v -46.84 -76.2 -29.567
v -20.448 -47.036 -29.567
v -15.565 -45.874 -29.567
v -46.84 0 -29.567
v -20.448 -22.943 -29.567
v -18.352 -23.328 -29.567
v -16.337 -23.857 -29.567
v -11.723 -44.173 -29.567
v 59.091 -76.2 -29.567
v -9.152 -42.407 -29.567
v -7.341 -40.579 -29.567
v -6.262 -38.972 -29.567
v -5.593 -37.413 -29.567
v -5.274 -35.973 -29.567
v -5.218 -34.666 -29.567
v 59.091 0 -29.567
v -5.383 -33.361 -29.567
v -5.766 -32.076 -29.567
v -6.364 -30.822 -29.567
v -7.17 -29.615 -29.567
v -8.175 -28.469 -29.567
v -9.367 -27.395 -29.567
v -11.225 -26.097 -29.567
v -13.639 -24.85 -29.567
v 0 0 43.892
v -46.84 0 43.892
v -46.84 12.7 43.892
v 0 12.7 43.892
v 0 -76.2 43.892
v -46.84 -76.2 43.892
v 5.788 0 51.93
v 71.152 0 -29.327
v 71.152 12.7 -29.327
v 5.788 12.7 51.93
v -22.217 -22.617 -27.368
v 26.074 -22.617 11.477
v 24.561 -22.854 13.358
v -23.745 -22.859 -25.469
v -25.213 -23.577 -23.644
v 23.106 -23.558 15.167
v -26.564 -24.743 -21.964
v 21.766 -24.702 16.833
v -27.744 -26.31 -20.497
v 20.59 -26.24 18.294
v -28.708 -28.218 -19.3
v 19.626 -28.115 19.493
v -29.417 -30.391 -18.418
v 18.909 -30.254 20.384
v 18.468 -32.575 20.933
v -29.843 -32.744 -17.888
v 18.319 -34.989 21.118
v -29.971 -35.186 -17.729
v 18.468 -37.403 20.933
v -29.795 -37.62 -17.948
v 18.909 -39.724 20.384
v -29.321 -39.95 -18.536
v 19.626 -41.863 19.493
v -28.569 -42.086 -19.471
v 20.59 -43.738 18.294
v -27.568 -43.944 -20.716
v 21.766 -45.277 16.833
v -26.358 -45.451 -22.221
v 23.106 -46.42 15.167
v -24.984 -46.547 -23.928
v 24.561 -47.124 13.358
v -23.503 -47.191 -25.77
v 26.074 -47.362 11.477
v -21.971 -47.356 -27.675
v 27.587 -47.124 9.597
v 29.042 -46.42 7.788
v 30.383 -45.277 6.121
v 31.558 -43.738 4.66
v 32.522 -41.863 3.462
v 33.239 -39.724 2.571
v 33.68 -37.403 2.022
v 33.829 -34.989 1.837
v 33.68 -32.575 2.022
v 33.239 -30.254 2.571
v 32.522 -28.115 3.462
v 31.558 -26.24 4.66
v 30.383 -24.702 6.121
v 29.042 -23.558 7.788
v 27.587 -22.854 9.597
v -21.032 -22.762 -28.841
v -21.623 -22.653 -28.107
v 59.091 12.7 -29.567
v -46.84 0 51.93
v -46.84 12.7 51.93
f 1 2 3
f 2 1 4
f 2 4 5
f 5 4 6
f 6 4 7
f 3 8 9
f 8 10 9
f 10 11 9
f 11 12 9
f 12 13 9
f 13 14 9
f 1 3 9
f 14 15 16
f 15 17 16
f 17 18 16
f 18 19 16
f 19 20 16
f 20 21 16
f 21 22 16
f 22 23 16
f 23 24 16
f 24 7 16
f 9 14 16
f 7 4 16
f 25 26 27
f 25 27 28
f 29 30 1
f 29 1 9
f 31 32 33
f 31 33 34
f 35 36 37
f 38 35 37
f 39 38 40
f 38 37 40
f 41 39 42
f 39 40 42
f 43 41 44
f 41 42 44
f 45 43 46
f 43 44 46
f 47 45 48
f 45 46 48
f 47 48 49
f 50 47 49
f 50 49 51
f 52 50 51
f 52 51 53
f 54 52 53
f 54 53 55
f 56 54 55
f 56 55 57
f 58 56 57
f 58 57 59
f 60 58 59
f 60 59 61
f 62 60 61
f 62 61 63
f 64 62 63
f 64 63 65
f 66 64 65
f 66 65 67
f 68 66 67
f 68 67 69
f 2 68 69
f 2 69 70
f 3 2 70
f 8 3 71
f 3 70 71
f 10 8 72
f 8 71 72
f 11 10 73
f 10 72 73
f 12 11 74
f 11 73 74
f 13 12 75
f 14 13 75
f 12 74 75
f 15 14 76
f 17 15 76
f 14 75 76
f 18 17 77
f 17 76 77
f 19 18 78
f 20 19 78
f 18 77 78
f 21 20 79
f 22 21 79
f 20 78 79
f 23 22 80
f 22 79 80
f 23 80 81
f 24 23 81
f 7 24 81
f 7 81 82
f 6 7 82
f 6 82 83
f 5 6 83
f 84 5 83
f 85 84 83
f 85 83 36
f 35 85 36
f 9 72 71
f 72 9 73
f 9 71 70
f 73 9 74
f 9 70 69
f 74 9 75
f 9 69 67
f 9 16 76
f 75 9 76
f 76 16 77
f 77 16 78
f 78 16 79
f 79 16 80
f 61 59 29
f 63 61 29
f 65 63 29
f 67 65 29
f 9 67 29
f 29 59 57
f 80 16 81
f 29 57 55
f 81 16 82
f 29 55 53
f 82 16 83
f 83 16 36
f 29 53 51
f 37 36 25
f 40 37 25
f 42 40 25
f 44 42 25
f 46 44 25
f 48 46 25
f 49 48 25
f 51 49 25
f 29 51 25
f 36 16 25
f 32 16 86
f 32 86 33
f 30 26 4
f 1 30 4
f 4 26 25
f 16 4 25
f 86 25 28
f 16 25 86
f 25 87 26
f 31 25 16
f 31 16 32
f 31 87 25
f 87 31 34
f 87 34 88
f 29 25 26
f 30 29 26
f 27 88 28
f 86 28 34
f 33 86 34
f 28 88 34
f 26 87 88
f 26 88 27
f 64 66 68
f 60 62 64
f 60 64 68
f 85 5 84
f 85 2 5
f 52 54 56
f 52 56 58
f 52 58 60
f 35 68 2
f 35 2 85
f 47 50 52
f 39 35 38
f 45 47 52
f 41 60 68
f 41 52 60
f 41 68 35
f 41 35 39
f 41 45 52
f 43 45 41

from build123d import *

# Parameters (mm, degrees)
F1_DEPTH = 76.2
F2_DEPTH = 12.7
F3_R     = 12.3726217029
F4_DEPTH = 61.976


with BuildPart() as f1:
    # F0 (on Front) → F1 (new body)
    with BuildSketch(Plane.XZ):
        Polygon((0, 43.8915863633), (-46.8400269747, 43.8915863633), (-46.8400269747, -29.5672435313), (59.0905994177, -29.5672435313), align=None)
    extrude(amount=F1_DEPTH)

    # F0 (on Front) → F2 (join)
    with BuildSketch(Plane.XZ):
        Polygon((-46.8400269747, 51.9304850427), (-46.8400269747, 43.8915863633), (0, 43.8915863633), (59.0905994177, -29.5672435313), (71.1518924552, -29.3272192482), (5.7878448555, 51.9304850427), align=None)
    extrude(amount=-F2_DEPTH)

    # F3 (on face) → F4 (cut)
    with BuildSketch(Plane(origin=(21.4360413899, 0, 17.2432440958), x_dir=(0, 1, 0), z_dir=(0.7791919552, 0, 0.6267853675))):
        with Locations((-34.9891483784, -7.3997466825)):
            Circle(F3_R)
    extrude(amount=-F4_DEPTH, mode=Mode.SUBTRACT)


solid = f1.part
